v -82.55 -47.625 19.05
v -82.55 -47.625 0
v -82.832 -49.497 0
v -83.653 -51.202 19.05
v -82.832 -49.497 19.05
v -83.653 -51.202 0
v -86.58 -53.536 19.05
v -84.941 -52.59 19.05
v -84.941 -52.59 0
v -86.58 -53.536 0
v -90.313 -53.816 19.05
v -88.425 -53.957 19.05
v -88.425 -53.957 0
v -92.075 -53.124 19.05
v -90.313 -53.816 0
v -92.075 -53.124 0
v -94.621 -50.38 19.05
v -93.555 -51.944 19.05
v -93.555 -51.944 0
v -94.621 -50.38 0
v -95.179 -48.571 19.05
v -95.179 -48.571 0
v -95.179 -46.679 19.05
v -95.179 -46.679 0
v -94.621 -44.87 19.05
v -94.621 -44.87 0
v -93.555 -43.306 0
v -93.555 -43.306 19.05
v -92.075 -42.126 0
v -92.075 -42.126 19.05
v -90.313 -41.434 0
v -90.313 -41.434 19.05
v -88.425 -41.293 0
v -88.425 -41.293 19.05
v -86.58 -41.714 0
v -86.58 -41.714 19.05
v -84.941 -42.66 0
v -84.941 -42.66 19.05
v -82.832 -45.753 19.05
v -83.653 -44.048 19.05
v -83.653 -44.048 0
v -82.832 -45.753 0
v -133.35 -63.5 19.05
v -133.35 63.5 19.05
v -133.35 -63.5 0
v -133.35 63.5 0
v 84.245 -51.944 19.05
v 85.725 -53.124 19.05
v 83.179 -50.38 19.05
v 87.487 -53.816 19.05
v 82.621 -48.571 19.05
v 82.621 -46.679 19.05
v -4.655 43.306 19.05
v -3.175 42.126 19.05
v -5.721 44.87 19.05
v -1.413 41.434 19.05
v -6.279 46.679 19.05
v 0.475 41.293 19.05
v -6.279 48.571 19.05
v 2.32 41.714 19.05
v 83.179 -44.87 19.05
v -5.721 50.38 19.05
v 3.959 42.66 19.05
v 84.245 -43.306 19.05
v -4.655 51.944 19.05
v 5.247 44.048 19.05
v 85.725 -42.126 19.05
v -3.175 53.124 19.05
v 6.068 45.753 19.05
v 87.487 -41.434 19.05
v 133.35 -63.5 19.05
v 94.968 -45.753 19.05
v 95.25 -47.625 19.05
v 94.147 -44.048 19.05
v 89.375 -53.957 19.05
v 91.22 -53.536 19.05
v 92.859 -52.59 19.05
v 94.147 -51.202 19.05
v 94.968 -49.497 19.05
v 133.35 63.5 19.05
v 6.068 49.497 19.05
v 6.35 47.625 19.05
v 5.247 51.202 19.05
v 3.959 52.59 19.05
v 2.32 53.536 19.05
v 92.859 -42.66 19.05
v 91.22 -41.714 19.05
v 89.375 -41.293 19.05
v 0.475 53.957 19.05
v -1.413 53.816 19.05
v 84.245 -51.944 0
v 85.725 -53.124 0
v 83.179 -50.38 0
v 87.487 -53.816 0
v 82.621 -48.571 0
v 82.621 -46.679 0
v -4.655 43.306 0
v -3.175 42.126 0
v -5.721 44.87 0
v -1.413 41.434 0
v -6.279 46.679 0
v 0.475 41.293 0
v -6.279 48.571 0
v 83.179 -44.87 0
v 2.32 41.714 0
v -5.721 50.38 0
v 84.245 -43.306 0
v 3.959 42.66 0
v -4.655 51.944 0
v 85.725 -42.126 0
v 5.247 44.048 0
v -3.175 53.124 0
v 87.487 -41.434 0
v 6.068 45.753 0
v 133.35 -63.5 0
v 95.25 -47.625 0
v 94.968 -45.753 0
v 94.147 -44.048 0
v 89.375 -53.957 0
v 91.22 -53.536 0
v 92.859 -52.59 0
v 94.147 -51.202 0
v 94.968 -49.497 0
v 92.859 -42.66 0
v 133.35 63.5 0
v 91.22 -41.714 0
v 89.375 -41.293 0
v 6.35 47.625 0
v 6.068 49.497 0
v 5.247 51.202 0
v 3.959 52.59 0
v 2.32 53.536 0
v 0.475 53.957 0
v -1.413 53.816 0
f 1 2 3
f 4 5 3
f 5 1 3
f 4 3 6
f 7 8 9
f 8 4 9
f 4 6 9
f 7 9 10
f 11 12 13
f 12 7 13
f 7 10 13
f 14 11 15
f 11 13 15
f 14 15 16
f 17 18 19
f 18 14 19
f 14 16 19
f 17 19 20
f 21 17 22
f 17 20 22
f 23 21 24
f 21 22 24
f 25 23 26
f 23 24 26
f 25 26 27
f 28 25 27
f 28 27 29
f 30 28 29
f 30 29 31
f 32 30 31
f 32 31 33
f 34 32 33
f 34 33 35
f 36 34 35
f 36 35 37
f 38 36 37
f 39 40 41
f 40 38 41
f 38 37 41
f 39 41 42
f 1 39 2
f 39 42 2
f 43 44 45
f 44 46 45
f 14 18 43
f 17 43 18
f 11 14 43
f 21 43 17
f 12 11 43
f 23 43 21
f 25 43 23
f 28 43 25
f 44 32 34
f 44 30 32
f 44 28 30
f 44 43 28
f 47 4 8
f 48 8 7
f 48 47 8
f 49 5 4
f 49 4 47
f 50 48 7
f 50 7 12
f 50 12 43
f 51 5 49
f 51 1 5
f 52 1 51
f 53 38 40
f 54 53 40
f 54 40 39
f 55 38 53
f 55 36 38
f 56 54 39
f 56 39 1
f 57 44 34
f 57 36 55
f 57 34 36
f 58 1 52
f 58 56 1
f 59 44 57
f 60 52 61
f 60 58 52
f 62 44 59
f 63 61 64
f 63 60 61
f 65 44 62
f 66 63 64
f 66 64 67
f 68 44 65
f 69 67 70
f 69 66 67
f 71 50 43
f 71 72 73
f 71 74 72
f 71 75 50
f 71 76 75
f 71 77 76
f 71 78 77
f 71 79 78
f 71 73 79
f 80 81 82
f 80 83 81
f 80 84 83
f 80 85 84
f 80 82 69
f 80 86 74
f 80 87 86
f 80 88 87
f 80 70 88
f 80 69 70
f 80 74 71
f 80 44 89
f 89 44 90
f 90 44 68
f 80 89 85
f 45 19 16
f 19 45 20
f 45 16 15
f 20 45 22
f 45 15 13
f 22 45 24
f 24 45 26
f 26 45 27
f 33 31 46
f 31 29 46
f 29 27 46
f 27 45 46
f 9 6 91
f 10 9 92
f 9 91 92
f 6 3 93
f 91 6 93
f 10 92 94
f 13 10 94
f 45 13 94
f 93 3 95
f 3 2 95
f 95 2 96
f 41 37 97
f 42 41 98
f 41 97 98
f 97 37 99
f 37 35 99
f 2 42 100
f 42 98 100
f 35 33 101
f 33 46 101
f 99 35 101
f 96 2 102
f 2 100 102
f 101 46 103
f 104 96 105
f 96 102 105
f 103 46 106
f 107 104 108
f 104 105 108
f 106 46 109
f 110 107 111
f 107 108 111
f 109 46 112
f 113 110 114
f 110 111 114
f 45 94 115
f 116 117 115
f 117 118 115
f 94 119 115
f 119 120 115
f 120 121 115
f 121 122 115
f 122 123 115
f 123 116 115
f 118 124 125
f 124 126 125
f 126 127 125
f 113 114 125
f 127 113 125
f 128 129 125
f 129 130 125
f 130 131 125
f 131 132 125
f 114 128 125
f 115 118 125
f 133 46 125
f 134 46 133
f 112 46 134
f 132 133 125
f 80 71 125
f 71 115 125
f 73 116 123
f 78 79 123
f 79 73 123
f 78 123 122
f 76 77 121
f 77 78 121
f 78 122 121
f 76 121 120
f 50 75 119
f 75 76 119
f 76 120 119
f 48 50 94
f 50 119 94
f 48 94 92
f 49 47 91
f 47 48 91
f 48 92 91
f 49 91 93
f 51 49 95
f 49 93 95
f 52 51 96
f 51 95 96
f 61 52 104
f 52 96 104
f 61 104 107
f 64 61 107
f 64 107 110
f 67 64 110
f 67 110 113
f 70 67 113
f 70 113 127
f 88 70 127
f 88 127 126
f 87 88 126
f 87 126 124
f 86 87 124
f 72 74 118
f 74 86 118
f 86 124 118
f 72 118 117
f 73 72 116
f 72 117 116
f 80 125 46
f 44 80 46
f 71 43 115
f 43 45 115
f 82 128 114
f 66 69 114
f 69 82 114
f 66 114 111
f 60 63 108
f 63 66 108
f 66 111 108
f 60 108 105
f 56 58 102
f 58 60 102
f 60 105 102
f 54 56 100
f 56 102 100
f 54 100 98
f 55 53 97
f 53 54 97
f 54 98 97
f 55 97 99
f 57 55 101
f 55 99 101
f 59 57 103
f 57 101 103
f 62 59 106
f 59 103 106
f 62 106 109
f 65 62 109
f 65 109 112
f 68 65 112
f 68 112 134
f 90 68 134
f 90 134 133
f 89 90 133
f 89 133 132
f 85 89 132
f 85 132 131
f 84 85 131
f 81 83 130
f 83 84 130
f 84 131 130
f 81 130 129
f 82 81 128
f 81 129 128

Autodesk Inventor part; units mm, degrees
ref_plane "YZ Plane" through (0, 0, 0) normal (1, 0, 0) x (0, 1, 0)
ref_plane "XZ Plane" through (0, 0, 0) normal (0, 1, 0) x (-1, 0, 0)
ref_plane "XY Plane" through (0, 0, 0) normal (0, 0, 1) x (1, 0, 0)
sketch "Sketch1" plane through (0, 0, 0) normal (0, 0, 1) x (1, 0, 0)
  line L0 (-133.35, -63.5) -> (133.35, -63.5)
  line L1 (133.35, -63.5) -> (133.35, 63.5)
  line L2 (133.35, 63.5) -> (-133.35, 63.5)
  line L3 (-133.35, 63.5) -> (-133.35, -63.5)
  line L4 (-133.35, -63.5) -> (133.35, 63.5) construction
  line L5 (133.35, -63.5) -> (-133.35, 63.5) construction
  line L6 (0, 88.9) -> (0, -88.9) construction
  circle A0 centre (0, 47.625) radius 6.35
  circle A1 centre (-88.9, -47.625) radius 6.35
  circle A2 centre (88.9, -47.625) radius 6.35
  line L7 (-200.025, 0) -> (200.025, 0) construction
  point P0 (0, 0)
  point P1 (0, 0)
  dimension "d0" = 266.7
  dimension "d1" = 127
  dimension "d9" = 47.625
  dimension "d10" = 47.625
  dimension "d11" = 177.8
  dimension "d12" = 12.7
extrude "Extrusion2" add sketch "Sketch1" along normal blind 19.05
equation "\"d0\" = Length"
equation "\"d1\" = FrameHeight"
equation "\"d9\" = 0.375 * FrameHeight"
equation "\"d10\" = d9"
equation "\"d11\" = 0.666667 * Length"
equation "\"d7\" = Thickness"
equation "\"FrameHeight\" = 127"
equation "\"Length\" = 266.7"
equation "\"Thickness\" = 19.05"
properties part number "framePlate"
